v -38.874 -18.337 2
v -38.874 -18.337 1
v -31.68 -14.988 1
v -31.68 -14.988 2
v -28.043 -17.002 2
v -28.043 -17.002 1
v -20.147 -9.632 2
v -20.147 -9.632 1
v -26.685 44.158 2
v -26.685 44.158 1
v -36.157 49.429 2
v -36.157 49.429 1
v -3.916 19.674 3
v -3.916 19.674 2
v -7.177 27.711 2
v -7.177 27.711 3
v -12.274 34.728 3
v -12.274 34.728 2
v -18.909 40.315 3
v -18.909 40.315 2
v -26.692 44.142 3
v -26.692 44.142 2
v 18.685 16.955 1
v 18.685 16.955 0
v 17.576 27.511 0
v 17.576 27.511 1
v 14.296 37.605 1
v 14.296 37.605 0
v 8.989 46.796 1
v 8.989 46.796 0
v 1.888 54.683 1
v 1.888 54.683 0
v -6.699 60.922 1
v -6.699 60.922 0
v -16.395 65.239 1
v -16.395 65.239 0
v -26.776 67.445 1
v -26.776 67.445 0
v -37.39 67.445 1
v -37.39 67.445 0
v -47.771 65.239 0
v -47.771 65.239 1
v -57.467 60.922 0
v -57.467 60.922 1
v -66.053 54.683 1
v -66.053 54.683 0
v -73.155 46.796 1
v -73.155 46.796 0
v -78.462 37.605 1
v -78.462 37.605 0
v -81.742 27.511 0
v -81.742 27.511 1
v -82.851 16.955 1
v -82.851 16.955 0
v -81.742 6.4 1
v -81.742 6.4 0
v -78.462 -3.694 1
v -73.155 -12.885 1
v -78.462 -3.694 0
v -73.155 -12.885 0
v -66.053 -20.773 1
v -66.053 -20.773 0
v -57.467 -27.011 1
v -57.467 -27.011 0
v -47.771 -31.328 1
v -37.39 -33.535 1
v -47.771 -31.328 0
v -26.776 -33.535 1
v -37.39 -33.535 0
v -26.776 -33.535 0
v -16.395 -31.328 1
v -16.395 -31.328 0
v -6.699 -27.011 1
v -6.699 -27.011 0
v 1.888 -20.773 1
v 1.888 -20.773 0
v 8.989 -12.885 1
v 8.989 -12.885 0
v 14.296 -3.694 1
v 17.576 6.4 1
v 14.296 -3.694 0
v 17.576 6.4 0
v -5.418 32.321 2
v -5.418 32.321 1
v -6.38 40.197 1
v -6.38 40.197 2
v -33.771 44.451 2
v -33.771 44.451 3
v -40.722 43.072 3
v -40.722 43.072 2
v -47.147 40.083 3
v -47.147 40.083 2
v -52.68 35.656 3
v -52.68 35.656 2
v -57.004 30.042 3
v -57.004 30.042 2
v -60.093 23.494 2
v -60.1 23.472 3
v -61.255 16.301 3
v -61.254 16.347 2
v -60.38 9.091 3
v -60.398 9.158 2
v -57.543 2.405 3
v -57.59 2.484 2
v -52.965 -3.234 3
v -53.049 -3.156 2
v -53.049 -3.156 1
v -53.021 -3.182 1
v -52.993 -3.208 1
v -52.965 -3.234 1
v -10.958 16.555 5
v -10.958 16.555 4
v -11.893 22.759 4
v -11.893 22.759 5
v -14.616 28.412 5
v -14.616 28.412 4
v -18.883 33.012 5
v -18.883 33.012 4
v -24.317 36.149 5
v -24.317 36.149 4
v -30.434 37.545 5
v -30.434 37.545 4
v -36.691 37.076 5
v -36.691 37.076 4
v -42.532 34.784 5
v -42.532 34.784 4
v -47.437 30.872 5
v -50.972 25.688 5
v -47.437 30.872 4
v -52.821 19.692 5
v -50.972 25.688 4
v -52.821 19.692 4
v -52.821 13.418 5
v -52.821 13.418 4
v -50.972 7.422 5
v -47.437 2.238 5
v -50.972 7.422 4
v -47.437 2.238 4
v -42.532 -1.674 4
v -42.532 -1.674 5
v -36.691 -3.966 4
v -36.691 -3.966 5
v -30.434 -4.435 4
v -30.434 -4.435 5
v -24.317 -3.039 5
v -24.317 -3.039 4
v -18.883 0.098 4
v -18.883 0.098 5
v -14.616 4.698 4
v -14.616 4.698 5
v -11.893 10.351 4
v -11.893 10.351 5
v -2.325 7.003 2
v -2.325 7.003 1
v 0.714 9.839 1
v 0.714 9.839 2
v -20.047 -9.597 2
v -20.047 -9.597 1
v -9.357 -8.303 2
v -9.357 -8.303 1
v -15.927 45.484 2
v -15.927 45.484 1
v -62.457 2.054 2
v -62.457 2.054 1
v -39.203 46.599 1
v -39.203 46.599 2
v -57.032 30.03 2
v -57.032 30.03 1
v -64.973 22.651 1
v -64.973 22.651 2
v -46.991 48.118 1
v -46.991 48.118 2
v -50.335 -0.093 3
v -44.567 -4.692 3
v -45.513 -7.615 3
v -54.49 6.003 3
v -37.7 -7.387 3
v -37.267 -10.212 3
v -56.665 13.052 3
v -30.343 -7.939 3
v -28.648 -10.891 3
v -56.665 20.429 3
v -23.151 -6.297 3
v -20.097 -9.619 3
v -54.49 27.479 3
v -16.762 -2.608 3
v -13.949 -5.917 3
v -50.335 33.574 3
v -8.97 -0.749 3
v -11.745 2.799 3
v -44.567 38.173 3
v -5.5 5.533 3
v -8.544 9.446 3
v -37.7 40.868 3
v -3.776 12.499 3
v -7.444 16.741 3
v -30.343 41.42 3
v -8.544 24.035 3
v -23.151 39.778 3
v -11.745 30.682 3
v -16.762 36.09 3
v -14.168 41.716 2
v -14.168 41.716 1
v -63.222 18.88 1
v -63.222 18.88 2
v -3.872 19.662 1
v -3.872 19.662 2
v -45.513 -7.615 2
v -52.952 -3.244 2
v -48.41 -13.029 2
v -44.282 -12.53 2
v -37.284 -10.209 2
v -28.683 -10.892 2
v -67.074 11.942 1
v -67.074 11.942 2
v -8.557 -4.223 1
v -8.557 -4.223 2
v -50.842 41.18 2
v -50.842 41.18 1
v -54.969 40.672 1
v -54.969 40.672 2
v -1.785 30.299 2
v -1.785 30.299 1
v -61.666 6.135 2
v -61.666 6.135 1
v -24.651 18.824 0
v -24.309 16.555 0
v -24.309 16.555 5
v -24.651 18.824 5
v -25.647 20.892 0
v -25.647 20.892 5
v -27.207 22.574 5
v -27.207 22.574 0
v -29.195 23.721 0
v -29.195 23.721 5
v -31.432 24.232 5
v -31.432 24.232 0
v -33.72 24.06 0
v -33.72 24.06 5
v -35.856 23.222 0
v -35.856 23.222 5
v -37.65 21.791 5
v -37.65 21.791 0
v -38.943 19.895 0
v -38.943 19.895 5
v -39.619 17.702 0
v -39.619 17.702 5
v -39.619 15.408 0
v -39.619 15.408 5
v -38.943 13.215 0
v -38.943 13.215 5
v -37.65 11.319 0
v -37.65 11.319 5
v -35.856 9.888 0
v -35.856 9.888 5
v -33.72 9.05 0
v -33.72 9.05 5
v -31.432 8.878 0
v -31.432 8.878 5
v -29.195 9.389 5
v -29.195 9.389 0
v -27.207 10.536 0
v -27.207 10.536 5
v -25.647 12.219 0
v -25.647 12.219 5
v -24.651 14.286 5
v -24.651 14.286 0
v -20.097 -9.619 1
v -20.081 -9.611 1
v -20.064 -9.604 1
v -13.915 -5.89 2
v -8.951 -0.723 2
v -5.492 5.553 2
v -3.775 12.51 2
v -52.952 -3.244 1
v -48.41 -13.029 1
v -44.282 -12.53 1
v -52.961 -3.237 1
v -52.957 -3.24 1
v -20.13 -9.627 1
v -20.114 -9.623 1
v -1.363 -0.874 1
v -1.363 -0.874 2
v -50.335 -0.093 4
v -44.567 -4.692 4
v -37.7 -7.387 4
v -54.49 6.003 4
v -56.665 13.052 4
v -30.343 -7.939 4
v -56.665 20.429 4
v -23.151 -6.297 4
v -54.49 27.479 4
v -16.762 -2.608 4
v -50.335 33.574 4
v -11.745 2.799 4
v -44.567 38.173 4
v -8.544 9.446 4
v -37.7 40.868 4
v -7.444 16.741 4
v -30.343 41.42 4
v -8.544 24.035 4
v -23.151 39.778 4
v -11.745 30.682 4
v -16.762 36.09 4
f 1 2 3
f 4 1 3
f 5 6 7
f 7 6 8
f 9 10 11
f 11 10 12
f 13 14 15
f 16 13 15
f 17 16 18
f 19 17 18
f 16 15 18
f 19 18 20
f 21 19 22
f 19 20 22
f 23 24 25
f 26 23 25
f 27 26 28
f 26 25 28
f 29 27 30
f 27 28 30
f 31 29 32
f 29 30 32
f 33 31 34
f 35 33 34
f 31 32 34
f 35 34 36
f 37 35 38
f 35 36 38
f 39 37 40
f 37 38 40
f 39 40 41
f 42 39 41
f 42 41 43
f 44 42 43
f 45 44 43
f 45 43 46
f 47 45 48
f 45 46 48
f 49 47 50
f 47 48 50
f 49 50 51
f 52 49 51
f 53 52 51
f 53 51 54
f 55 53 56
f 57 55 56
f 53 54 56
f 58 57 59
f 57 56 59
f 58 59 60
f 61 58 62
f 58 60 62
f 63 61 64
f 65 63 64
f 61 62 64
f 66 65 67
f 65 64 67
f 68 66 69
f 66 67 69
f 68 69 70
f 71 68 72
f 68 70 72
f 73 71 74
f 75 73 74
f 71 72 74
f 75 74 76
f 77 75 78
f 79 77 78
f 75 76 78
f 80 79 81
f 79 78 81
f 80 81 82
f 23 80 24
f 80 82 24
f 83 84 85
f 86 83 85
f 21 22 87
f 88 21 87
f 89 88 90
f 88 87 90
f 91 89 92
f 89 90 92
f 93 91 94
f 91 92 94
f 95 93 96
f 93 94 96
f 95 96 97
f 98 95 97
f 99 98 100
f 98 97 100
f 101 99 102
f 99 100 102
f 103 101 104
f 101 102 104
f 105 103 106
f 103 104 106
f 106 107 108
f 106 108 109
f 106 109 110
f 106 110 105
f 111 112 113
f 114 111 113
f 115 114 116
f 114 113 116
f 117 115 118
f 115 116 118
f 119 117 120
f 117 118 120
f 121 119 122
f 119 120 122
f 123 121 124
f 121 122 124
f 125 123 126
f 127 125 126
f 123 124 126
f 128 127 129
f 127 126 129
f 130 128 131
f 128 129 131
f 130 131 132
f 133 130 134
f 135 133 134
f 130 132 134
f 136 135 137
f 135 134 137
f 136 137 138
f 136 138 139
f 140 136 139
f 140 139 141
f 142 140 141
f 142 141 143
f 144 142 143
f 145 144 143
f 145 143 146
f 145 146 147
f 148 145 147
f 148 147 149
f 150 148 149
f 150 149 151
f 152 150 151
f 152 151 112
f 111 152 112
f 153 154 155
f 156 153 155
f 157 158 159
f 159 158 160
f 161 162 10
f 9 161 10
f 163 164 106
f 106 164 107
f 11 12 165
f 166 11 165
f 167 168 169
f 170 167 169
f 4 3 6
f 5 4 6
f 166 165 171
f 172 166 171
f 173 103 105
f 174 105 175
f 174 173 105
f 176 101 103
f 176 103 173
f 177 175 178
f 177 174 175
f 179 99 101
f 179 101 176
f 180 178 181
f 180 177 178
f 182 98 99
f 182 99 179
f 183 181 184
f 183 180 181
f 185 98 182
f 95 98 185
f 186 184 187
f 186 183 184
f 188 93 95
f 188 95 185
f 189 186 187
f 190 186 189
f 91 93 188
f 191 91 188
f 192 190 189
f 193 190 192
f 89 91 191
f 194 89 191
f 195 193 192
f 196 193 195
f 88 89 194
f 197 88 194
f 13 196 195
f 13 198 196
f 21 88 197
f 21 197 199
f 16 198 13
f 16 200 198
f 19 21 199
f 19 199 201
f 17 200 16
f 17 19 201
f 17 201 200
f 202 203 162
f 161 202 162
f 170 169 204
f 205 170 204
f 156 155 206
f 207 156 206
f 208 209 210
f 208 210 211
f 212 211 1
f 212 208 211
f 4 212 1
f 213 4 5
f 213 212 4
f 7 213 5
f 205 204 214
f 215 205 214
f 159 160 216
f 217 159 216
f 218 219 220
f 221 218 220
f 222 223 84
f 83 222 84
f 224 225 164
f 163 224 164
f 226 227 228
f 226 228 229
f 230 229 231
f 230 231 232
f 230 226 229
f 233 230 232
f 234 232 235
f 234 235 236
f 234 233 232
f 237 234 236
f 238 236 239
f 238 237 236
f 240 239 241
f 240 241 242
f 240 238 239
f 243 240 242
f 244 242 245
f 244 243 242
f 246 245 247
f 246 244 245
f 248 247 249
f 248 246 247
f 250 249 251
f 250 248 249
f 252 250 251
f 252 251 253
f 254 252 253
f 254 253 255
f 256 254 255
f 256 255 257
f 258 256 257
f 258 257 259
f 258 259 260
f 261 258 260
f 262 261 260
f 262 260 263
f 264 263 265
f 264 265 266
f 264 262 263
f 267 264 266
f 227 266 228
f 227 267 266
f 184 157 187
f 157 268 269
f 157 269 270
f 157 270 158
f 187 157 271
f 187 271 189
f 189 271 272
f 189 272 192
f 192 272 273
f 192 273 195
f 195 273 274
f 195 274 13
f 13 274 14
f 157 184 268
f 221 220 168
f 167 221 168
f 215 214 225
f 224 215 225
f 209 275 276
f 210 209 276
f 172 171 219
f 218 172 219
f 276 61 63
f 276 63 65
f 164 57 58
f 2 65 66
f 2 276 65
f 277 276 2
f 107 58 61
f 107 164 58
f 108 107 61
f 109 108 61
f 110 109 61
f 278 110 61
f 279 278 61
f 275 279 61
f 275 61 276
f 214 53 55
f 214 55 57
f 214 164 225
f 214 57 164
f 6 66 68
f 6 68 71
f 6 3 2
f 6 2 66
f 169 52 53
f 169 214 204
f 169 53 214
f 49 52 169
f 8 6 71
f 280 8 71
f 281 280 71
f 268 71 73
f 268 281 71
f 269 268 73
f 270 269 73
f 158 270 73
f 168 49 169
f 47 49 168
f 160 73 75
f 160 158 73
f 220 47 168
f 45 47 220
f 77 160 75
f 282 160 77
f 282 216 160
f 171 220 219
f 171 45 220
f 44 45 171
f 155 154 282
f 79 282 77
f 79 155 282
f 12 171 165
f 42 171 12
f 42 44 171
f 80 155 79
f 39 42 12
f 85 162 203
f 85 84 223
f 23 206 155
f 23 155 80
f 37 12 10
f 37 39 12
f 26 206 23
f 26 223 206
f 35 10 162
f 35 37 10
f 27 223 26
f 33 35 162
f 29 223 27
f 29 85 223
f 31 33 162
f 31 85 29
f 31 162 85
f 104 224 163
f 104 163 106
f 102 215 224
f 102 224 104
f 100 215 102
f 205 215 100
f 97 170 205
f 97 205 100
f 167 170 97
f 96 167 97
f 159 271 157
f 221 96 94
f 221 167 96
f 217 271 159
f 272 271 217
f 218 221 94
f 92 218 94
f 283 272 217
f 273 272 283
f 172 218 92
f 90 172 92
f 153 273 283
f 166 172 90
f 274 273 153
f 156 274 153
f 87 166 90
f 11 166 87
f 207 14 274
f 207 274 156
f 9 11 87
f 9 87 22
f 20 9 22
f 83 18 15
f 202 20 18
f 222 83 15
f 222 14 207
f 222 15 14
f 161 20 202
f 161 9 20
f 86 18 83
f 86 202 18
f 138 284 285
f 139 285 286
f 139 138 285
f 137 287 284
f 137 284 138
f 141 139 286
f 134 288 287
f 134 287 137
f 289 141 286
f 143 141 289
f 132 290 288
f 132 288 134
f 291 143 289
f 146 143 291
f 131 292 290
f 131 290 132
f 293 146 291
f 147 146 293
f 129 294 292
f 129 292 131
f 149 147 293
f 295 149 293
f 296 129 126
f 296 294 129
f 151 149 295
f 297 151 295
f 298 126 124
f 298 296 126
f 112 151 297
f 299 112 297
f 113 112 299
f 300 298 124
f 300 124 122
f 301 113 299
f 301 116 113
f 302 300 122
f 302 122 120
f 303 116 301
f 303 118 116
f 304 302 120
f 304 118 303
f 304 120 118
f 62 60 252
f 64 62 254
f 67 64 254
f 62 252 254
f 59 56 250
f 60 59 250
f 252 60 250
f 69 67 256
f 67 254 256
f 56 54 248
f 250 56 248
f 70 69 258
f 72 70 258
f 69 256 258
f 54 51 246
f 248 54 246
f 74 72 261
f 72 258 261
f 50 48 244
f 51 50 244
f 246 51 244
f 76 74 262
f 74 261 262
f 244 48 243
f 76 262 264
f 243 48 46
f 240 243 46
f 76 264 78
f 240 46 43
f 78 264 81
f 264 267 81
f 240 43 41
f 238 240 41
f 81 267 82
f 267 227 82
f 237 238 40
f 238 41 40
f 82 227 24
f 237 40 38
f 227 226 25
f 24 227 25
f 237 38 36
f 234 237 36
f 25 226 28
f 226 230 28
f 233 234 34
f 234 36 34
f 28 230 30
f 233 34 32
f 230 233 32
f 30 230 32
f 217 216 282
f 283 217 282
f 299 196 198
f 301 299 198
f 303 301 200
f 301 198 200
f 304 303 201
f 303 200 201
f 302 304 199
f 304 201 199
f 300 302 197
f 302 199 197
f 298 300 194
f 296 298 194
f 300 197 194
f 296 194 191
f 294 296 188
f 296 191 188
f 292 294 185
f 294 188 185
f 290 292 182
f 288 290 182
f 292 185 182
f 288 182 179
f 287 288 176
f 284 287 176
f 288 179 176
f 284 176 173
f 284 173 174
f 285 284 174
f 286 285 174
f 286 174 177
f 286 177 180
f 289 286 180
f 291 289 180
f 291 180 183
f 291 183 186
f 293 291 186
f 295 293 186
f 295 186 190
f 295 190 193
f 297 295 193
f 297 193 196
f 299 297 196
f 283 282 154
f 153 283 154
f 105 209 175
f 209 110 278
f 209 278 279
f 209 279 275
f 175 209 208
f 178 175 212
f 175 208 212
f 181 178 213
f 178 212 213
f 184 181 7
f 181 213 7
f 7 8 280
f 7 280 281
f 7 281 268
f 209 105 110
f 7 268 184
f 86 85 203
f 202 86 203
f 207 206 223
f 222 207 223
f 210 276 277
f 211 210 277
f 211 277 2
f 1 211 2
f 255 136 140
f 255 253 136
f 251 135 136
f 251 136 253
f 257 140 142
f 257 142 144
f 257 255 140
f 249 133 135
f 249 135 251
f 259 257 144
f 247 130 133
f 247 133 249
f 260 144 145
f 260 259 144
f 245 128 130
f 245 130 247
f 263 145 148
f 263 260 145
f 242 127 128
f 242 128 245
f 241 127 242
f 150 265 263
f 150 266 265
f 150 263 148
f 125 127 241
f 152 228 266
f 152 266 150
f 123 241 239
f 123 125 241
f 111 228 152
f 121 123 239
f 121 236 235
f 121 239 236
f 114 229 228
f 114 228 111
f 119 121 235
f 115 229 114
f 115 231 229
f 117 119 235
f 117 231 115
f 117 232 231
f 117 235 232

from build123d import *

# Parameters (mm, degrees)
F0_R     = 9.34954834
F1_DEPTH = 2
F2_R     = 9.9314109332
F3_DEPTH = 3
F4_R     = 24.7483511113
F4_R_2   = 9.9812356791
F5_DEPTH = 4
F6_R     = 21.0489130691
F6_R_2   = 7.6981825143
F7_DEPTH = 5
F8_R     = 50.7680243712
F8_R_2   = 10.127452023
F9_DEPTH = 1


with BuildPart() as f1:
    # F0 (on Top) → F1 (new body)
    with BuildSketch(Plane.XY):
        Polygon((-2.3253114279, 7.0025283952), (0.7141198772, 9.8394449822), (-3.8715197243, 19.6616453301), align=None)
        Polygon((-1.3632647613, -0.8739403047), (-2.3253114279, 7.0025283952), (-7.2580368413, 2.3984662733), (-8.5569428744, -4.2228637399), align=None)
        Polygon((-7.2580368413, 2.3984662733), (-2.3253114279, 7.0025283952), (-3.8715197243, 19.6616453301), align=None)
        Polygon((-7.2580368413, 2.3984662733), (-3.8715197243, 19.6616453301), (-11.3136030379, 35.6021988113), (-26.6853706311, 44.1575836885), (-44.1454681102, 42.0056437837), (-57.0322600669, 30.0299833677), (-60.3811104422, 12.7594578836), (-52.9738182843, -3.1972921683), (-37.5834241603, -11.7191240163), (-20.1186738854, -9.6052774824), align=None)
        with Locations((-32.1363285184, 16.2093285471)):
            Circle(F0_R, mode=Mode.SUBTRACT)
        Polygon((-5.4177280207, 32.3207622651), (-3.8715197243, 19.6616453301), (-1.7848262074, 30.2988169654), align=None)
        Polygon((-11.3136030379, 35.6021988113), (-3.8715197243, 19.6616453301), (-5.4177280207, 32.3207622651), align=None)
        Polygon((-8.5569428744, -4.2228637399), (-7.2580368413, 2.3984662733), (-20.1186738854, -9.6052774824), align=None)
        Polygon((-26.6853706311, 44.1575836885), (-11.3136030379, 35.6021988113), (-14.1680303391, 41.7162328976), align=None)
        Polygon((-14.1680303391, 41.7162328976), (-11.3136030379, 35.6021988113), (-5.4177280207, 32.3207622651), (-6.3797746873, 40.197230965), align=None)
        Polygon((-8.5569428744, -4.2228637399), (-20.1186738854, -9.6052774824), (-9.3572987281, -8.3027741418), align=None)
        Polygon((-31.6804048965, -14.9876912249), (-20.1186738854, -9.6052774824), (-37.5834241603, -11.7191240163), align=None)
        Polygon((-28.0431009638, -17.0017067365), (-20.1186738854, -9.6052774824), (-31.6804048965, -14.9876912249), align=None)
        Polygon((-26.6853706311, 44.1575836885), (-14.1680303391, 41.7162328976), (-15.9268624188, 45.4835592832), align=None)
        Polygon((-39.202710923, 46.5989344794), (-26.6853706311, 44.1575836885), (-36.1570982709, 49.4292139626), align=None)
        Polygon((-44.1454681102, 42.0056437837), (-26.6853706311, 44.1575836885), (-39.202710923, 46.5989344794), align=None)
        Polygon((-44.2820672543, -12.5298944689), (-37.5834241603, -11.7191240163), (-52.9738182843, -3.1972921683), align=None)
        Polygon((-31.6804048965, -14.9876912249), (-37.5834241603, -11.7191240163), (-44.2820672543, -12.5298944689), (-38.8740830096, -18.3366146601), align=None)
        Polygon((-57.0322600669, 30.0299833677), (-44.1454681102, 42.0056437837), (-50.8423266141, 41.1802625354), align=None)
        Polygon((-50.8423266141, 41.1802625354), (-44.1454681102, 42.0056437837), (-39.202710923, 46.5989344794), (-46.9909665748, 48.117936412), align=None)
        Polygon((-44.2820672543, -12.5298944689), (-52.9738182843, -3.1972921683), (-48.4096161882, -13.0294724686), align=None)
        Polygon((-61.6655693143, 6.1353101322), (-52.9738182843, -3.1972921683), (-60.3811104422, 12.7594578836), align=None)
        Polygon((-62.4570231615, 2.0536635052), (-52.9738182843, -3.1972921683), (-61.6655693143, 6.1353101322), align=None)
        Polygon((-57.0322600669, 30.0299833677), (-50.8423266141, 41.1802625354), (-54.968775925, 40.6716817015), align=None)
        Polygon((-63.2221935197, 18.8797042), (-57.0322600669, 30.0299833677), (-64.9728031974, 22.650858418), align=None)
        Polygon((-60.3811104422, 12.7594578836), (-57.0322600669, 30.0299833677), (-63.2221935197, 18.8797042), align=None)
        Polygon((-61.6655693143, 6.1353101322), (-60.3811104422, 12.7594578836), (-63.2221935197, 18.8797042), (-67.0735535589, 11.9420303234), align=None)
    extrude(amount=F1_DEPTH)

    # F2 (on Top) → F3 (join)
    with BuildSketch(Plane.XY):
        with BuildLine():
            ThreePointArc((-3.9161127061, 19.6736101061), (-12.2738953914, 34.7283526931), (-26.6918931156, 44.142127037))
            ThreePointArc((-26.6918931156, 44.142127037), (-44.0241929939, 41.7700167457), (-57.0044443011, 30.04190512))
            ThreePointArc((-57.0044443011, 30.04190512), (-61.0707346416, 12.665349743), (-52.9653914273, -3.2337950543))
            ThreePointArc((-52.9653914273, -3.2337950543), (-37.2668042058, -10.2120179587), (-20.0973842293, -9.6185086295))
            ThreePointArc((-20.0973842293, -9.6185086295), (-7.0292200811, 2.277912207), (-3.9161127061, 19.6736101061))
        make_face()
        with Locations((-31.4443483949, 17.2526501119)):
            Circle(F2_R, mode=Mode.SUBTRACT)
    extrude(amount=F3_DEPTH)

    # F4 (on Top) → F5 (join)
    with BuildSketch(Plane.XY):
        with Locations((-32.1926809847, 16.7406294495)):
            Circle(F4_R)
        with Locations((-32.1926809847, 16.7406294495)):
            Circle(F4_R_2, mode=Mode.SUBTRACT)
    extrude(amount=F5_DEPTH)

    # F6 (on Top) → F7 (join)
    with BuildSketch(Plane.XY):
        with Locations((-32.0071727037, 16.5551174432)):
            Circle(F6_R)
        with Locations((-32.0071727037, 16.5551174432)):
            Circle(F6_R_2, mode=Mode.SUBTRACT)
    extrude(amount=F7_DEPTH)

    # F8 (on Top) → F9 (join)
    with BuildSketch(Plane.XY):
        with Locations((-32.0829190314, 16.9553998858)):
            Circle(F8_R)
        with Locations((-32.0829190314, 16.9553998858)):
            Circle(F8_R_2, mode=Mode.SUBTRACT)
    extrude(amount=F9_DEPTH)


solid = f1.part
